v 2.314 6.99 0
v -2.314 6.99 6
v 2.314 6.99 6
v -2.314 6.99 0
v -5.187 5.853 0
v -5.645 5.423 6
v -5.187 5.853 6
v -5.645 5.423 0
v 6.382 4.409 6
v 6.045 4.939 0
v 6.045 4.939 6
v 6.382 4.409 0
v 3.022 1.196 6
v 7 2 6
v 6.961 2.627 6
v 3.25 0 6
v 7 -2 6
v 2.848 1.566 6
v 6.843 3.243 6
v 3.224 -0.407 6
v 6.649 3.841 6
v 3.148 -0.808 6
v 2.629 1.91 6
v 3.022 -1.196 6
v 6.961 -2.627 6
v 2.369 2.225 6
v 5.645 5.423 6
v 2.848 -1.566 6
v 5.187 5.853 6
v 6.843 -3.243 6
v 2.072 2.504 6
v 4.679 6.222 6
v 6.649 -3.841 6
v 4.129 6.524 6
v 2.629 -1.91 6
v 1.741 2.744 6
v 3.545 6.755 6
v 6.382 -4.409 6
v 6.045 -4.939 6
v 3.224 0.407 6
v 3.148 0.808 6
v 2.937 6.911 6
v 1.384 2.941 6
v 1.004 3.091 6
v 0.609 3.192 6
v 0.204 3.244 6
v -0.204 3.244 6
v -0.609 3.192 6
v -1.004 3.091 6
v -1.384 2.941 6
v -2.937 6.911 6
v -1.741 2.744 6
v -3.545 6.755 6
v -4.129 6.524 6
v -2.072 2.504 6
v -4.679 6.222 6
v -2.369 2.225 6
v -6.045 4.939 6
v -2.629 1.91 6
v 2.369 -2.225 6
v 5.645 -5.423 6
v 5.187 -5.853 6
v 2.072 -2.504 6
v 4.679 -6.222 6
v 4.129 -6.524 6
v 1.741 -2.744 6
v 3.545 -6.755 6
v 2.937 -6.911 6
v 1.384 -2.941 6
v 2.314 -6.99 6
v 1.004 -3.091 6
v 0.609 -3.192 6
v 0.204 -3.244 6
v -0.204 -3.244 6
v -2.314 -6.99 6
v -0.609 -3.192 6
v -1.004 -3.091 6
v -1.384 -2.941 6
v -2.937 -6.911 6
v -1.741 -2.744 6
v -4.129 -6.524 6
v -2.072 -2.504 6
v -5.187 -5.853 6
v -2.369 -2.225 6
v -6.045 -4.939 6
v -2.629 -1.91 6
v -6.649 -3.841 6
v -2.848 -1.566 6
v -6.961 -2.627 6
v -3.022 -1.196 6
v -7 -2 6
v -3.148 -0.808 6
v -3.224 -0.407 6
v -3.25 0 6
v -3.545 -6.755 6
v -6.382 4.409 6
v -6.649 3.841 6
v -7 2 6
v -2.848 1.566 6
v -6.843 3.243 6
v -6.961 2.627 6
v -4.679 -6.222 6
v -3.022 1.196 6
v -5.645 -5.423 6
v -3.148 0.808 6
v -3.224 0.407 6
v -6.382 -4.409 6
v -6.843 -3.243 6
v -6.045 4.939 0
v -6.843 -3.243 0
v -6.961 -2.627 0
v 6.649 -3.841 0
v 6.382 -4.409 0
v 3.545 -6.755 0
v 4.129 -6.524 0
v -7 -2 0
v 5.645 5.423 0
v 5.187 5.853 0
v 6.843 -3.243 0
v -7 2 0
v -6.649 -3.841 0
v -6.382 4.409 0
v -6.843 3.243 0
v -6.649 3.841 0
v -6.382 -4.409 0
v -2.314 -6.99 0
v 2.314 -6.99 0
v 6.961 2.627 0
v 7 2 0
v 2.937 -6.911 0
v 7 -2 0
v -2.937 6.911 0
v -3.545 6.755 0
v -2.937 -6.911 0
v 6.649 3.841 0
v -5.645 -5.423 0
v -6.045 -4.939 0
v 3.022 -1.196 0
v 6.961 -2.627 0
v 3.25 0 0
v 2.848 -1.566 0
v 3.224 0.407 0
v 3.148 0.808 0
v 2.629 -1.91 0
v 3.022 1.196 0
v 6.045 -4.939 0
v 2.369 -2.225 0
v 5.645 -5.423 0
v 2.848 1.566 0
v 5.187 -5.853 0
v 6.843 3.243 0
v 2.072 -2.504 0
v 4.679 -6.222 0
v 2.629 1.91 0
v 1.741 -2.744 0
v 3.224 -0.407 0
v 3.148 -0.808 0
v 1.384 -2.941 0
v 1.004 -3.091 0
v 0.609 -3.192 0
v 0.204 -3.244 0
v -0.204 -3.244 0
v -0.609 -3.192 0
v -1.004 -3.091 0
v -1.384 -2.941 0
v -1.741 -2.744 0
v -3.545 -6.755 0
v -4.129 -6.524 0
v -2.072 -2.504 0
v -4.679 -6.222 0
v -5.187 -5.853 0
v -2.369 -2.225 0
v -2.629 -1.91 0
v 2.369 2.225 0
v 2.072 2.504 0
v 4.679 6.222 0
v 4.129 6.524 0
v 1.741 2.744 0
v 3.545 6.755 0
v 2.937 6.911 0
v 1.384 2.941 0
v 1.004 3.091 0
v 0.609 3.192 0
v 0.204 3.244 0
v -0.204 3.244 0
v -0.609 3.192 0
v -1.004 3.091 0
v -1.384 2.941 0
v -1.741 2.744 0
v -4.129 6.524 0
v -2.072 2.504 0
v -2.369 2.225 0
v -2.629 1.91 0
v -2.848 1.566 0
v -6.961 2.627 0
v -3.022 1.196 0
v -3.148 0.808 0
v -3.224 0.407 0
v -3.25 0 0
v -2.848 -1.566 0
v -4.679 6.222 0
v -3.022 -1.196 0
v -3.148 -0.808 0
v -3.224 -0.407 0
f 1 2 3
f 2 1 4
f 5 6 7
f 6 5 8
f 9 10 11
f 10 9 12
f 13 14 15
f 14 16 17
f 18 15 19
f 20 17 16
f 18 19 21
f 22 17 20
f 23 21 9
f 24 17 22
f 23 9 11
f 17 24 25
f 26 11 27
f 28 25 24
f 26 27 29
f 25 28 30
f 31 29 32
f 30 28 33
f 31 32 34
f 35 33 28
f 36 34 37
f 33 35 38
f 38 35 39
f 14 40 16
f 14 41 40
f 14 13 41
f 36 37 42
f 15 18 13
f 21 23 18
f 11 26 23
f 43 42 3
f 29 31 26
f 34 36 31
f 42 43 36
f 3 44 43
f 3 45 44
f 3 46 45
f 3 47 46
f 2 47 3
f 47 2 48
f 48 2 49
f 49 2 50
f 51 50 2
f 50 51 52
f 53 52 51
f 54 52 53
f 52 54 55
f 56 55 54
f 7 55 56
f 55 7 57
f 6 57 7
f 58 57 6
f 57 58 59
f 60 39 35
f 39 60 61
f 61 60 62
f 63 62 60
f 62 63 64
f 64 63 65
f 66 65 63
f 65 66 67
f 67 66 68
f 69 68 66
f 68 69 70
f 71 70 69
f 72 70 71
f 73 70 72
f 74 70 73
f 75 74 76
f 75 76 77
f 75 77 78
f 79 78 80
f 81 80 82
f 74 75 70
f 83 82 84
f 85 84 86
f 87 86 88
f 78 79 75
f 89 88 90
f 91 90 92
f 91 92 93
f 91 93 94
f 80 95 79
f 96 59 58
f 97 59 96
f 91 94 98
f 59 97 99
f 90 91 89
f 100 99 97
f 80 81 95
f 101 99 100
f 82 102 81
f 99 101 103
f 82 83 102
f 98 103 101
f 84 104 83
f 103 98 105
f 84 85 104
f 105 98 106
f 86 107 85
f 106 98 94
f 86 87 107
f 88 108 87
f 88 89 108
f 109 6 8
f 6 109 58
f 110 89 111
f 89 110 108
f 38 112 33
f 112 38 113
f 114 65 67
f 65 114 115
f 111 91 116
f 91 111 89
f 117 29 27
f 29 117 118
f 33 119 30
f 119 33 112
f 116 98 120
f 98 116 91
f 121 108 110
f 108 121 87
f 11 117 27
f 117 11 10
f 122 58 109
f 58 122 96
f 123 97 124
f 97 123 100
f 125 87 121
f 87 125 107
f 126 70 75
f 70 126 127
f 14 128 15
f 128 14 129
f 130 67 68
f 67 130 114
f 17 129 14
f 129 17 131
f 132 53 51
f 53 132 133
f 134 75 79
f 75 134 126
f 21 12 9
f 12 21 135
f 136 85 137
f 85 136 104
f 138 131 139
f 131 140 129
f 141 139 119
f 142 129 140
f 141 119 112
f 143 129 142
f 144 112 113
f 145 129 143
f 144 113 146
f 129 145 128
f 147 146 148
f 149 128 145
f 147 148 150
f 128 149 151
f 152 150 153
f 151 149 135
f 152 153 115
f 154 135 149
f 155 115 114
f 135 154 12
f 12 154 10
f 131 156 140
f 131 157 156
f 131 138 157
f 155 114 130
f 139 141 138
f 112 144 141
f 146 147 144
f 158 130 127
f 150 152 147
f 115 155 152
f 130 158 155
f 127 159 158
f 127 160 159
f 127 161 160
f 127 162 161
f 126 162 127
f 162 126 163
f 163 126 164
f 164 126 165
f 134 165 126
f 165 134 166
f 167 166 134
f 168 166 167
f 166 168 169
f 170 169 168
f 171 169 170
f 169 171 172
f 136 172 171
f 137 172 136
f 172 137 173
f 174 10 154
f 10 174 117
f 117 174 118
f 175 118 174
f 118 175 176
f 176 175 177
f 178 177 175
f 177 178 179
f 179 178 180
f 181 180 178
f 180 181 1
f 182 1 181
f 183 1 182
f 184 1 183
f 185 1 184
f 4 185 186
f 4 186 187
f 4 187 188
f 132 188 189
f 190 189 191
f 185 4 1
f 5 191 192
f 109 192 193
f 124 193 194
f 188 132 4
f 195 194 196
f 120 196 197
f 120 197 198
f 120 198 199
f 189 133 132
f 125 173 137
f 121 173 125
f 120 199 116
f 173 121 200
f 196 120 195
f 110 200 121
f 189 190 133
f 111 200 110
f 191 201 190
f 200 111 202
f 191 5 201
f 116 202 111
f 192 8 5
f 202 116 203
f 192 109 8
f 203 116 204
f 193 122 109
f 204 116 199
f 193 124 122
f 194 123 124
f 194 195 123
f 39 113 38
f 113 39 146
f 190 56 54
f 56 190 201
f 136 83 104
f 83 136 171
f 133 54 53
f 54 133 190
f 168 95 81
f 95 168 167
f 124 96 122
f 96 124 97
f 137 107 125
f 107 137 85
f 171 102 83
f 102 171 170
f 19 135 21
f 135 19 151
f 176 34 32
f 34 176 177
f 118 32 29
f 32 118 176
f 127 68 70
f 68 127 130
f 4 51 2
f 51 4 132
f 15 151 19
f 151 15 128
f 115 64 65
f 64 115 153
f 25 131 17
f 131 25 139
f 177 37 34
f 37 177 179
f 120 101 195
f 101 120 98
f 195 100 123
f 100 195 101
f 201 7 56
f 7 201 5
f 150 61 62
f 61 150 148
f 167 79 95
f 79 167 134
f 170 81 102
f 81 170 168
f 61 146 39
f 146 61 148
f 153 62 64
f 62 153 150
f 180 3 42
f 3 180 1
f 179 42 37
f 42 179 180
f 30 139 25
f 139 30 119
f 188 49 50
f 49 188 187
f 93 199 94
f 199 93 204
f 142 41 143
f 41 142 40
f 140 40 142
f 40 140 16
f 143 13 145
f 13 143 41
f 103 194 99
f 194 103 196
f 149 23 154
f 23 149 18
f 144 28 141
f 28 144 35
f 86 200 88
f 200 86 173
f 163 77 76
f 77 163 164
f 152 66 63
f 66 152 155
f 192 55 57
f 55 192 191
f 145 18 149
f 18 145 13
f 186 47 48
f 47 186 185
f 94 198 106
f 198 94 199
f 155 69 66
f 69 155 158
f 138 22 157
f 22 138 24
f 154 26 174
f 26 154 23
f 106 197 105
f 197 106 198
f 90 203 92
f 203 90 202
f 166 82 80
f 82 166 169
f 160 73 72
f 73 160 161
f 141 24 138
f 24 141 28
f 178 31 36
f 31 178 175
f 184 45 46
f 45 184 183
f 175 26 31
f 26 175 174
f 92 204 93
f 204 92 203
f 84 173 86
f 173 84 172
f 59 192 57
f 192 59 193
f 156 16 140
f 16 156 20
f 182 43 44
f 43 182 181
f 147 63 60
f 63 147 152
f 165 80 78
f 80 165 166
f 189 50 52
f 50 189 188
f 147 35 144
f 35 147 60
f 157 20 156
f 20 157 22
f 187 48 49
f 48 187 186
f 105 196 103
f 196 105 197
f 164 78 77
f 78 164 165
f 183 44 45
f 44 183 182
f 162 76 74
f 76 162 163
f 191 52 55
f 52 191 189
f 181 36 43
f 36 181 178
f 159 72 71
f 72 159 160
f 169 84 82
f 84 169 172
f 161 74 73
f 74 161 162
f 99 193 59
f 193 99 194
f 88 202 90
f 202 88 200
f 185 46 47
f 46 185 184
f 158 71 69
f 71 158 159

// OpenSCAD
// Generated by SolidPython 1.1.3 on 2023-03-12 22:43:40
$fn = 50;


difference() {
	union() {
		translate(v = [0, 0, 0]) {
			rotate(a = [0, 0, 0]) {
				hull() {
					translate(v = [-2.0000000000, 2.0000000000, 0]) {
						rotate(a = [0, 0, 0]) {
							translate(v = [0, 0, 0]) {
								rotate(a = [0, 0, 0]) {
									cylinder(h = 6, r = 5);
								}
							}
						}
					}
					translate(v = [2.0000000000, 2.0000000000, 0]) {
						rotate(a = [0, 0, 0]) {
							translate(v = [0, 0, 0]) {
								rotate(a = [0, 0, 0]) {
									cylinder(h = 6, r = 5);
								}
							}
						}
					}
					translate(v = [-2.0000000000, -2.0000000000, 0]) {
						rotate(a = [0, 0, 0]) {
							translate(v = [0, 0, 0]) {
								rotate(a = [0, 0, 0]) {
									cylinder(h = 6, r = 5);
								}
							}
						}
					}
					translate(v = [2.0000000000, -2.0000000000, 0]) {
						rotate(a = [0, 0, 0]) {
							translate(v = [0, 0, 0]) {
								rotate(a = [0, 0, 0]) {
									cylinder(h = 6, r = 5);
								}
							}
						}
					}
				}
			}
		}
	}
	union() {
		translate(v = [0.0000000000, 0.0000000000, 0]) {
			rotate(a = [0, 0, 0]) {
				translate(v = [0, 0, -50]) {
					rotate(a = [0, 0, 0]) {
						cylinder(h = 100, r = 3.2500000000);
					}
				}
			}
		}
	}
}
/***********************************************
*********      SolidPython code:      **********
************************************************
 
from solid import *
import os
import subprocess

import oomB

import opsc_library_gen

mode = "laser"
#mode = "3d_print"

defined_objects = {}

radius_dict = {}
countersunk_dict = {}


def set_mode(m):
    global mode
    mode = m
    radius_dict['M6'] = 6.5/2
    radius_dict['M3'] = 3.3/2
    if mode == "laser":
        radius_dict['M6'] = 6/2
        radius_dict['M3'] = 3/2

    countersunk_dict['M3'] = {}
    countersunk_dict['M3']['little_rad'] = radius_dict['M3']
    countersunk_dict['M3']['big_rad'] = (5.5+0.6)/2
    if mode == "laser":
        countersunk_dict['M3']['big_rad'] = (4.75+0.6)/2
        countersunk_dict['M3']['little_rad'] = (4.75+0.6)/2

    countersunk_dict['M3']['height'] = 1.7


def opsc_make_object(filename, objects, save_type="none",resolution=50, layers = 1, tilediff = 200, mode="laser", overwrite=True):
    if overwrite or not os.path.exists(filename):
        set_mode(mode)
        save_type = save_type.lower()
        os.makedirs(os.path.dirname(filename), exist_ok=True)
        final_object = opsc_get_object(objects, mode = mode)
        # Save the final object to the specified filename    
        scad_render_to_file(final_object, filename, file_header='$fn = %s;' % resolution, include_orig_code=True)
        if mode == "laser":
            filename_laser = filename.replace(".scad","-flat.scad")
            scad_render_to_file(getLaser(final_object, layers=layers, tilediff=tilediff), filename_laser, file_header='$fn = %s;' % resolution, include_orig_code=True)
            if save_type == "all":
                saveToAll(filename_laser)
            elif save_type == "dxf":
                saveToDxf(filename_laser)
        if save_type == "all":
            saveToAll(filename)
        elif save_type == "dxf":
            saveToDxf(filename)


def opsc_get_object(objects, mode = "laser"):
    # Create the solidpython objects only include the positive objects and if they don't have inclusion or their inclusion is either all or mode
    # Initialize an empty list to store the results
    positive_objects = []

    # Iterate over the "objects" list
    for obj in objects:
        # Check if the current object has a "type" key with a value of "positive"
        if obj['type'] == 'positive':
            # Check if the current object has an "inclusion" key and its value matches "mode",
            # or if the current object does not have an "inclusion" key at all
            if not 'inclusion' in obj or obj['inclusion'] == "all" or obj['inclusion'] == mode:
                # Call the "get_opsc_item" function with the current object as an argument
                opsc_item = get_opsc_item(obj)
                # Add the result to the "positive_objects" list
                positive_objects.append(opsc_item)
# Initialize an empty list to store the results
    negative_objects = []

    # Iterate over the "objects" list
    for obj in objects:
        # Check if the current object has a "type" key with a value of "negative"
        if obj['type'] == 'negative':
            # Check if the current object has an "inclusion" key and its value matches "mode",
            # or if the current object does not have an "inclusion" key at all
            if not 'inclusion' in obj or obj['inclusion'] == "all" or obj['inclusion'] == mode:
                # Call the "get_opsc_item" function with the current object as an argument
                opsc_item = get_opsc_item(obj)
                # Add the result to the "negative_objects" list
                negative_objects.append(opsc_item)
    
    #positive_objects = [get_opsc_item(obj) for obj in objects if obj['type'] == 'positive']
    #negative_objects = [get_opsc_item(obj) for obj in objects if obj['type'] == 'negative']
    # Union the positive objects
    positive_object = union()(*positive_objects)
    # Union the negative objects
    negative_object = union()(*negative_objects)
    # Create the final object by subtracting the negative objects from the positive objects
    return difference()(positive_object, negative_object)

def get_opsc_item(params):
    # A dictionary to map radius string values to numerical values
    #radius_dict = {'small': 5, 'medium': 10, 'large': 15}
    # An array of function names for basic shapes
    basic_shapes = ['cube', 'sphere', 'cylinder']
    
    # An array of function names for other shapes
    other_shapes = ['hole', 'slot', 'rounded_rectangle', 'countersunk']
    


    # Convert radius to r if present, and remove radius from the params dictionary
    if 'radius' in params:
        if isinstance(params['radius'], str):
            # Use the radius_dict to map the radius string value to a numerical value
            params['r'] = radius_dict[params['radius']]
        else:
            params['r'] = params['radius']
        del params['radius']
    

    # Check if the object type is a basic shape
    if params['shape'] in basic_shapes:
        # Remove shape and unexpected dictionary values
        allowed_keys = {'size', 'r', 'r1', 'r2', 'd', 'h', 'rw', 'rh', 'dw', 'dh'}
        shape_params = {k: v for k, v in params.items() if k in allowed_keys}

        # Call the corresponding function for the shape parameter, using ** notation to pass the shape_params dictionary as keyword arguments
        return get_opsc_transform(params,globals()[params['shape']](**shape_params))
    
    # If the object type is not a basic shape, check if it's a defined object or one of the other shapes
    elif params['shape'] in other_shapes:
        # Call the corresponding function for the shape parameter, passing the params dictionary as an argument
        p2 = copy.deepcopy(params)
        p2["pos"] = [0,0,0]
        return get_opsc_transform(params,globals()[params['shape']](p2))
    
    # If the object is not a basic shape or a defined object, try to import it from a .scad file
    else:
        obj = defined_objects[params['shape']]
        return get_opsc_transform(params,obj)

def get_opsc_transform(params, solid_obj):
    # Rotate the object based on the 'rot' field in the params dictionary, or the 'rotX', 'rotY', and 'rotZ' fields if 'rot' is not present
    rot = params.get('rot', [])
    if rot:
        rotX, rotY, rotZ = rot
    else:
        rotX = params.get('rotX', 0)
        rotY = params.get('rotY', 0)
        rotZ = params.get('rotZ', 0)
    solid_obj = rotate([rotX, rotY, rotZ])(solid_obj)

    # Translate the object based on the 'pos' field in the params dictionary, or the 'x', 'y', and 'z' fields if 'pos' is not present
    pos = params.get('pos', [])
    if pos:
        x, y, z = pos
    else:
        x = params.get('x', 0)
        y = params.get('y', 0)
        z = params.get('z', 0)
    solid_obj = translate([x, y, z])(solid_obj)
    return solid_obj


import random

def opsc_easy_array(type, shape, repeats, pos_start, shift_arr, **kwargs):
    for i in range(0,3):
        repeats.append(1)
        pos_start.append(0)
        shift_arr.append(0)
    return_objects = []

    for x in range(0,repeats[0]):
        for y in range(0,repeats[1]):
            for z in range(0,repeats[2]):
                return_objects.append(opsc_easy(type, shape, pos=[pos_start[0]+x*shift_arr[0],pos_start[1]+y*shift_arr[1],pos_start[2]+z*shift_arr[2]], **kwargs))
    return return_objects                



def opsc_easy(type, shape, **kwargs):
    obj = {
        'type': type,
        'shape': shape
    }
    for param in ['size', 'r', 'r1', 'r2', 'd', 'h', 'rw', 'rh', 'dw', 'dh', 'pos', 'x', 'y', 'z', 'rot', 'rotX', 'rotY', 'rotZ', "w", "inclusion"]:
        if param in kwargs:
            obj[param] = kwargs[param]
    return obj

def hole(params):
    p2 = copy.deepcopy(params)  
    # Check if the radius is a string and replace it with the corresponding value from the dictionary
    if isinstance(p2['r'], str):
        p2['r'] = radius_dict[p2['r']]
    
    # Set the height to 100 if not specified
    if 'h' not in p2:
        p2['h'] = 100
        p2["pos"] = [0,0,-50]
    p2["center"] = True
    # Create the cylinder object
    p2["shape"] = "cylinder"
    p2["type"] = "positive"

    return get_opsc_item(p2)

import copy

def countersunk(params):
    p2 = copy.deepcopy(params)
    counter_rad = p2['r']
    p2['r'] = radius_dict[p2['r']]
    hp = copy.deepcopy(p2)
    hp["type"] = "positive"
    hp["shape"] = "hole"
    del hp["rot"]
    hol = get_opsc_item(hp)
    
    cp = copy.deepcopy(p2)
    cp["h"] = countersunk_dict[counter_rad]["height"]
    cp["r2"] = countersunk_dict[counter_rad]["little_rad"]
    cp["r1"] = countersunk_dict[counter_rad]["big_rad"]
    del cp["r"]
    del cp["rot"]
    cp["type"] = "positive"
    cp["shape"] = "cylinder"
    cp["pos"] = [0,0,0]

    top = get_opsc_item(cp)
    return union()(hol,top)



def slot(params):  
    p2 = copy.deepcopy(params) 
    if isinstance(p2['r'], str):
        p2['r'] = radius_dict[p2['r']]
    p2["type"] = "positive"
    p2["shape"] = "hole"
    del p2["rot"]
    p2["pos"] = [0,0,0]
    left = copy.deepcopy(p2)
    right = copy.deepcopy(p2)
    left["pos"][0] = p2["w"] / 2 - p2["r"] 
    
    right["pos"][0] = -p2["w"] / 2 + p2["r"] 
    pass
    leftObj = get_opsc_item(left)
    rightObj = get_opsc_item(right)
    return hull()(leftObj, rightObj)

def rounded_rectangle(params):   
    p2 = copy.deepcopy(params) 
    p2["h"] = p2["size"][2]
    p2["pos"] = p2.get("pos", [0, 0, 0]) 
    p2["type"] = "positive"
    p2["shape"] = "hole"
    p2["pos"] = [0,0,0]
    
    if 'rot' in p2:
        del p2["rot"]   
    if 'r' not in p2:
        p2["r"] = 5 
    tl = copy.deepcopy(p2)
    tr = copy.deepcopy(p2)
    bl = copy.deepcopy(p2)
    br = copy.deepcopy(p2)
    tl["pos"][0] = -(p2["size"][0] - p2["r"]*2)/2
    tl["pos"][1] = (p2["size"][1] - p2["r"]*2)/2
    tr["pos"][0] = (p2["size"][0] - p2["r"]*2)/2
    tr["pos"][1] = (p2["size"][1] - p2["r"]*2)/2
    bl["pos"][0] = -(p2["size"][0] - p2["r"]*2)/2
    bl["pos"][1] = -(p2["size"][1] - p2["r"]*2)/2
    br["pos"][0] = (p2["size"][0] - p2["r"]*2)/2
    br["pos"][1] = -(p2["size"][1] - p2["r"]*2)/2
    del tl["size"]
    del tr["size"]
    del bl["size"]
    del br["size"]
    tlo = get_opsc_item(tl)
    tro = get_opsc_item(tr)
    blo = get_opsc_item(bl)
    bro = get_opsc_item(br)    
    return hull()(tlo, tro, blo, bro)



def import_scad_object(filename):
    # Import the .scad file and convert it to a solidpython object
    #filename = "parts"
    obj = import_scad(filename)
    return obj.main()
    


import os
import solid as solidpython

# A dictionary to store the defined objects


def load_scad_objects():
    opsc_library_gen.gen_library(defined_objects)

import random

def test(num_objects):
    objects = []
    for i in range(num_objects):
        # Choose a random shape
        #shape = random.choice(['cube', 'sphere', 'cylinder', 'hole', 'slot', "rounded_rectangle"])
        shape = random.choice(["rounded_rectangle"])

        # Choose a random type
        type = random.choice(['positive', 'negative'])
        
        # Create an empty object dictionary
        obj = {'shape': shape, 'type': type}
        
        # Set shape-specific parameters
        if obj['shape'] in ['cube']:
            obj['size'] =  [random.uniform(5, 15), random.uniform(5, 15), random.uniform(5, 15)]
        if obj['shape'] in ['rounded_rectangle']:
            obj['size'] =  [random.uniform(5, 15), random.uniform(5, 15), random.uniform(5, 15)]
            obj['r'] = random.uniform(0.5, 5)
        elif obj['shape'] == 'sphere':
            obj['r'] = random.uniform(5, 15)
        elif obj['shape'] in ['cylinder', 'hole']:
            obj['r'] = random.uniform(0.5, 5)
            obj['h'] = random.uniform(5, 15)
        elif obj['shape'] == 'slot':
            obj['r'] = random.uniform(0.5, 5)
            obj['h'] = random.uniform(5, 15)
            obj['w'] = random.uniform(5, 15)
        
        # Set a random position and rotation
        obj['pos'] = [random.uniform(-20, 20), random.uniform(-20, 20), random.uniform(-20, 20)]
        obj['rot'] = [random.uniform(-180, 180), random.uniform(-180, 180), random.uniform(-180, 180)]
        
        # Add the object to the list
        objects.append(obj)
    return objects

####### old file saving
def saveToAll(fileIn):
    saveToDxf(fileIn)
    saveToPng(fileIn)
    saveToStl(fileIn)
    saveToSvg(fileIn)

def saveToDxf(fileIn, fileOut="", copy_to_laser=True):
    if fileOut == "":
        fileOut = fileIn.replace(".scad",".dxf")
    saveToFile(fileIn, fileOut)


    
def saveToPng(fileIn, fileOut="",extra="--render"):
    if fileOut == "":
        fileOut = fileIn.replace(".scad",".png")
    saveToFile(fileIn, fileOut)

def saveToStl(fileIn, fileOut=""):
    if fileOut == "":
        fileOut = fileIn.replace(".scad",".stl")
    saveToFile(fileIn, fileOut)
    
def saveToSvg(fileIn, fileOut=""):
    if fileOut == "":
        fileOut = fileIn.replace(".scad",".svg")
    saveToFile(fileIn, fileOut)

def saveToFile(fileIn, fileOut,extra=""):
    #extra = extra + " --colorscheme Tomorrow"

    launchStr = 'openscad -o "' + fileOut + '"' + extra + ' "' + fileIn + '"'
    if ".png" in fileOut:
        launchStr = launchStr + " --render"
    print("            saveToFile launch string: " + launchStr)
    subprocess.run(launchStr)
    x=0

def getLaser(final_object,start=1.5,layers=1,thickness=3,tilediff=200):
        rv= []

        for x in range(layers):
            rv.append(translate([0,x*tilediff,0])(
                    projection()(
                        intersection()(translate([-500,-500,start+x*thickness])(cube(size=[1000,1000,0.1])),
                            final_object
                        )
                    )
            )
            )
            
        return union()(rv)

set_mode("laser")
load_scad_objects() 
 
************************************************/
